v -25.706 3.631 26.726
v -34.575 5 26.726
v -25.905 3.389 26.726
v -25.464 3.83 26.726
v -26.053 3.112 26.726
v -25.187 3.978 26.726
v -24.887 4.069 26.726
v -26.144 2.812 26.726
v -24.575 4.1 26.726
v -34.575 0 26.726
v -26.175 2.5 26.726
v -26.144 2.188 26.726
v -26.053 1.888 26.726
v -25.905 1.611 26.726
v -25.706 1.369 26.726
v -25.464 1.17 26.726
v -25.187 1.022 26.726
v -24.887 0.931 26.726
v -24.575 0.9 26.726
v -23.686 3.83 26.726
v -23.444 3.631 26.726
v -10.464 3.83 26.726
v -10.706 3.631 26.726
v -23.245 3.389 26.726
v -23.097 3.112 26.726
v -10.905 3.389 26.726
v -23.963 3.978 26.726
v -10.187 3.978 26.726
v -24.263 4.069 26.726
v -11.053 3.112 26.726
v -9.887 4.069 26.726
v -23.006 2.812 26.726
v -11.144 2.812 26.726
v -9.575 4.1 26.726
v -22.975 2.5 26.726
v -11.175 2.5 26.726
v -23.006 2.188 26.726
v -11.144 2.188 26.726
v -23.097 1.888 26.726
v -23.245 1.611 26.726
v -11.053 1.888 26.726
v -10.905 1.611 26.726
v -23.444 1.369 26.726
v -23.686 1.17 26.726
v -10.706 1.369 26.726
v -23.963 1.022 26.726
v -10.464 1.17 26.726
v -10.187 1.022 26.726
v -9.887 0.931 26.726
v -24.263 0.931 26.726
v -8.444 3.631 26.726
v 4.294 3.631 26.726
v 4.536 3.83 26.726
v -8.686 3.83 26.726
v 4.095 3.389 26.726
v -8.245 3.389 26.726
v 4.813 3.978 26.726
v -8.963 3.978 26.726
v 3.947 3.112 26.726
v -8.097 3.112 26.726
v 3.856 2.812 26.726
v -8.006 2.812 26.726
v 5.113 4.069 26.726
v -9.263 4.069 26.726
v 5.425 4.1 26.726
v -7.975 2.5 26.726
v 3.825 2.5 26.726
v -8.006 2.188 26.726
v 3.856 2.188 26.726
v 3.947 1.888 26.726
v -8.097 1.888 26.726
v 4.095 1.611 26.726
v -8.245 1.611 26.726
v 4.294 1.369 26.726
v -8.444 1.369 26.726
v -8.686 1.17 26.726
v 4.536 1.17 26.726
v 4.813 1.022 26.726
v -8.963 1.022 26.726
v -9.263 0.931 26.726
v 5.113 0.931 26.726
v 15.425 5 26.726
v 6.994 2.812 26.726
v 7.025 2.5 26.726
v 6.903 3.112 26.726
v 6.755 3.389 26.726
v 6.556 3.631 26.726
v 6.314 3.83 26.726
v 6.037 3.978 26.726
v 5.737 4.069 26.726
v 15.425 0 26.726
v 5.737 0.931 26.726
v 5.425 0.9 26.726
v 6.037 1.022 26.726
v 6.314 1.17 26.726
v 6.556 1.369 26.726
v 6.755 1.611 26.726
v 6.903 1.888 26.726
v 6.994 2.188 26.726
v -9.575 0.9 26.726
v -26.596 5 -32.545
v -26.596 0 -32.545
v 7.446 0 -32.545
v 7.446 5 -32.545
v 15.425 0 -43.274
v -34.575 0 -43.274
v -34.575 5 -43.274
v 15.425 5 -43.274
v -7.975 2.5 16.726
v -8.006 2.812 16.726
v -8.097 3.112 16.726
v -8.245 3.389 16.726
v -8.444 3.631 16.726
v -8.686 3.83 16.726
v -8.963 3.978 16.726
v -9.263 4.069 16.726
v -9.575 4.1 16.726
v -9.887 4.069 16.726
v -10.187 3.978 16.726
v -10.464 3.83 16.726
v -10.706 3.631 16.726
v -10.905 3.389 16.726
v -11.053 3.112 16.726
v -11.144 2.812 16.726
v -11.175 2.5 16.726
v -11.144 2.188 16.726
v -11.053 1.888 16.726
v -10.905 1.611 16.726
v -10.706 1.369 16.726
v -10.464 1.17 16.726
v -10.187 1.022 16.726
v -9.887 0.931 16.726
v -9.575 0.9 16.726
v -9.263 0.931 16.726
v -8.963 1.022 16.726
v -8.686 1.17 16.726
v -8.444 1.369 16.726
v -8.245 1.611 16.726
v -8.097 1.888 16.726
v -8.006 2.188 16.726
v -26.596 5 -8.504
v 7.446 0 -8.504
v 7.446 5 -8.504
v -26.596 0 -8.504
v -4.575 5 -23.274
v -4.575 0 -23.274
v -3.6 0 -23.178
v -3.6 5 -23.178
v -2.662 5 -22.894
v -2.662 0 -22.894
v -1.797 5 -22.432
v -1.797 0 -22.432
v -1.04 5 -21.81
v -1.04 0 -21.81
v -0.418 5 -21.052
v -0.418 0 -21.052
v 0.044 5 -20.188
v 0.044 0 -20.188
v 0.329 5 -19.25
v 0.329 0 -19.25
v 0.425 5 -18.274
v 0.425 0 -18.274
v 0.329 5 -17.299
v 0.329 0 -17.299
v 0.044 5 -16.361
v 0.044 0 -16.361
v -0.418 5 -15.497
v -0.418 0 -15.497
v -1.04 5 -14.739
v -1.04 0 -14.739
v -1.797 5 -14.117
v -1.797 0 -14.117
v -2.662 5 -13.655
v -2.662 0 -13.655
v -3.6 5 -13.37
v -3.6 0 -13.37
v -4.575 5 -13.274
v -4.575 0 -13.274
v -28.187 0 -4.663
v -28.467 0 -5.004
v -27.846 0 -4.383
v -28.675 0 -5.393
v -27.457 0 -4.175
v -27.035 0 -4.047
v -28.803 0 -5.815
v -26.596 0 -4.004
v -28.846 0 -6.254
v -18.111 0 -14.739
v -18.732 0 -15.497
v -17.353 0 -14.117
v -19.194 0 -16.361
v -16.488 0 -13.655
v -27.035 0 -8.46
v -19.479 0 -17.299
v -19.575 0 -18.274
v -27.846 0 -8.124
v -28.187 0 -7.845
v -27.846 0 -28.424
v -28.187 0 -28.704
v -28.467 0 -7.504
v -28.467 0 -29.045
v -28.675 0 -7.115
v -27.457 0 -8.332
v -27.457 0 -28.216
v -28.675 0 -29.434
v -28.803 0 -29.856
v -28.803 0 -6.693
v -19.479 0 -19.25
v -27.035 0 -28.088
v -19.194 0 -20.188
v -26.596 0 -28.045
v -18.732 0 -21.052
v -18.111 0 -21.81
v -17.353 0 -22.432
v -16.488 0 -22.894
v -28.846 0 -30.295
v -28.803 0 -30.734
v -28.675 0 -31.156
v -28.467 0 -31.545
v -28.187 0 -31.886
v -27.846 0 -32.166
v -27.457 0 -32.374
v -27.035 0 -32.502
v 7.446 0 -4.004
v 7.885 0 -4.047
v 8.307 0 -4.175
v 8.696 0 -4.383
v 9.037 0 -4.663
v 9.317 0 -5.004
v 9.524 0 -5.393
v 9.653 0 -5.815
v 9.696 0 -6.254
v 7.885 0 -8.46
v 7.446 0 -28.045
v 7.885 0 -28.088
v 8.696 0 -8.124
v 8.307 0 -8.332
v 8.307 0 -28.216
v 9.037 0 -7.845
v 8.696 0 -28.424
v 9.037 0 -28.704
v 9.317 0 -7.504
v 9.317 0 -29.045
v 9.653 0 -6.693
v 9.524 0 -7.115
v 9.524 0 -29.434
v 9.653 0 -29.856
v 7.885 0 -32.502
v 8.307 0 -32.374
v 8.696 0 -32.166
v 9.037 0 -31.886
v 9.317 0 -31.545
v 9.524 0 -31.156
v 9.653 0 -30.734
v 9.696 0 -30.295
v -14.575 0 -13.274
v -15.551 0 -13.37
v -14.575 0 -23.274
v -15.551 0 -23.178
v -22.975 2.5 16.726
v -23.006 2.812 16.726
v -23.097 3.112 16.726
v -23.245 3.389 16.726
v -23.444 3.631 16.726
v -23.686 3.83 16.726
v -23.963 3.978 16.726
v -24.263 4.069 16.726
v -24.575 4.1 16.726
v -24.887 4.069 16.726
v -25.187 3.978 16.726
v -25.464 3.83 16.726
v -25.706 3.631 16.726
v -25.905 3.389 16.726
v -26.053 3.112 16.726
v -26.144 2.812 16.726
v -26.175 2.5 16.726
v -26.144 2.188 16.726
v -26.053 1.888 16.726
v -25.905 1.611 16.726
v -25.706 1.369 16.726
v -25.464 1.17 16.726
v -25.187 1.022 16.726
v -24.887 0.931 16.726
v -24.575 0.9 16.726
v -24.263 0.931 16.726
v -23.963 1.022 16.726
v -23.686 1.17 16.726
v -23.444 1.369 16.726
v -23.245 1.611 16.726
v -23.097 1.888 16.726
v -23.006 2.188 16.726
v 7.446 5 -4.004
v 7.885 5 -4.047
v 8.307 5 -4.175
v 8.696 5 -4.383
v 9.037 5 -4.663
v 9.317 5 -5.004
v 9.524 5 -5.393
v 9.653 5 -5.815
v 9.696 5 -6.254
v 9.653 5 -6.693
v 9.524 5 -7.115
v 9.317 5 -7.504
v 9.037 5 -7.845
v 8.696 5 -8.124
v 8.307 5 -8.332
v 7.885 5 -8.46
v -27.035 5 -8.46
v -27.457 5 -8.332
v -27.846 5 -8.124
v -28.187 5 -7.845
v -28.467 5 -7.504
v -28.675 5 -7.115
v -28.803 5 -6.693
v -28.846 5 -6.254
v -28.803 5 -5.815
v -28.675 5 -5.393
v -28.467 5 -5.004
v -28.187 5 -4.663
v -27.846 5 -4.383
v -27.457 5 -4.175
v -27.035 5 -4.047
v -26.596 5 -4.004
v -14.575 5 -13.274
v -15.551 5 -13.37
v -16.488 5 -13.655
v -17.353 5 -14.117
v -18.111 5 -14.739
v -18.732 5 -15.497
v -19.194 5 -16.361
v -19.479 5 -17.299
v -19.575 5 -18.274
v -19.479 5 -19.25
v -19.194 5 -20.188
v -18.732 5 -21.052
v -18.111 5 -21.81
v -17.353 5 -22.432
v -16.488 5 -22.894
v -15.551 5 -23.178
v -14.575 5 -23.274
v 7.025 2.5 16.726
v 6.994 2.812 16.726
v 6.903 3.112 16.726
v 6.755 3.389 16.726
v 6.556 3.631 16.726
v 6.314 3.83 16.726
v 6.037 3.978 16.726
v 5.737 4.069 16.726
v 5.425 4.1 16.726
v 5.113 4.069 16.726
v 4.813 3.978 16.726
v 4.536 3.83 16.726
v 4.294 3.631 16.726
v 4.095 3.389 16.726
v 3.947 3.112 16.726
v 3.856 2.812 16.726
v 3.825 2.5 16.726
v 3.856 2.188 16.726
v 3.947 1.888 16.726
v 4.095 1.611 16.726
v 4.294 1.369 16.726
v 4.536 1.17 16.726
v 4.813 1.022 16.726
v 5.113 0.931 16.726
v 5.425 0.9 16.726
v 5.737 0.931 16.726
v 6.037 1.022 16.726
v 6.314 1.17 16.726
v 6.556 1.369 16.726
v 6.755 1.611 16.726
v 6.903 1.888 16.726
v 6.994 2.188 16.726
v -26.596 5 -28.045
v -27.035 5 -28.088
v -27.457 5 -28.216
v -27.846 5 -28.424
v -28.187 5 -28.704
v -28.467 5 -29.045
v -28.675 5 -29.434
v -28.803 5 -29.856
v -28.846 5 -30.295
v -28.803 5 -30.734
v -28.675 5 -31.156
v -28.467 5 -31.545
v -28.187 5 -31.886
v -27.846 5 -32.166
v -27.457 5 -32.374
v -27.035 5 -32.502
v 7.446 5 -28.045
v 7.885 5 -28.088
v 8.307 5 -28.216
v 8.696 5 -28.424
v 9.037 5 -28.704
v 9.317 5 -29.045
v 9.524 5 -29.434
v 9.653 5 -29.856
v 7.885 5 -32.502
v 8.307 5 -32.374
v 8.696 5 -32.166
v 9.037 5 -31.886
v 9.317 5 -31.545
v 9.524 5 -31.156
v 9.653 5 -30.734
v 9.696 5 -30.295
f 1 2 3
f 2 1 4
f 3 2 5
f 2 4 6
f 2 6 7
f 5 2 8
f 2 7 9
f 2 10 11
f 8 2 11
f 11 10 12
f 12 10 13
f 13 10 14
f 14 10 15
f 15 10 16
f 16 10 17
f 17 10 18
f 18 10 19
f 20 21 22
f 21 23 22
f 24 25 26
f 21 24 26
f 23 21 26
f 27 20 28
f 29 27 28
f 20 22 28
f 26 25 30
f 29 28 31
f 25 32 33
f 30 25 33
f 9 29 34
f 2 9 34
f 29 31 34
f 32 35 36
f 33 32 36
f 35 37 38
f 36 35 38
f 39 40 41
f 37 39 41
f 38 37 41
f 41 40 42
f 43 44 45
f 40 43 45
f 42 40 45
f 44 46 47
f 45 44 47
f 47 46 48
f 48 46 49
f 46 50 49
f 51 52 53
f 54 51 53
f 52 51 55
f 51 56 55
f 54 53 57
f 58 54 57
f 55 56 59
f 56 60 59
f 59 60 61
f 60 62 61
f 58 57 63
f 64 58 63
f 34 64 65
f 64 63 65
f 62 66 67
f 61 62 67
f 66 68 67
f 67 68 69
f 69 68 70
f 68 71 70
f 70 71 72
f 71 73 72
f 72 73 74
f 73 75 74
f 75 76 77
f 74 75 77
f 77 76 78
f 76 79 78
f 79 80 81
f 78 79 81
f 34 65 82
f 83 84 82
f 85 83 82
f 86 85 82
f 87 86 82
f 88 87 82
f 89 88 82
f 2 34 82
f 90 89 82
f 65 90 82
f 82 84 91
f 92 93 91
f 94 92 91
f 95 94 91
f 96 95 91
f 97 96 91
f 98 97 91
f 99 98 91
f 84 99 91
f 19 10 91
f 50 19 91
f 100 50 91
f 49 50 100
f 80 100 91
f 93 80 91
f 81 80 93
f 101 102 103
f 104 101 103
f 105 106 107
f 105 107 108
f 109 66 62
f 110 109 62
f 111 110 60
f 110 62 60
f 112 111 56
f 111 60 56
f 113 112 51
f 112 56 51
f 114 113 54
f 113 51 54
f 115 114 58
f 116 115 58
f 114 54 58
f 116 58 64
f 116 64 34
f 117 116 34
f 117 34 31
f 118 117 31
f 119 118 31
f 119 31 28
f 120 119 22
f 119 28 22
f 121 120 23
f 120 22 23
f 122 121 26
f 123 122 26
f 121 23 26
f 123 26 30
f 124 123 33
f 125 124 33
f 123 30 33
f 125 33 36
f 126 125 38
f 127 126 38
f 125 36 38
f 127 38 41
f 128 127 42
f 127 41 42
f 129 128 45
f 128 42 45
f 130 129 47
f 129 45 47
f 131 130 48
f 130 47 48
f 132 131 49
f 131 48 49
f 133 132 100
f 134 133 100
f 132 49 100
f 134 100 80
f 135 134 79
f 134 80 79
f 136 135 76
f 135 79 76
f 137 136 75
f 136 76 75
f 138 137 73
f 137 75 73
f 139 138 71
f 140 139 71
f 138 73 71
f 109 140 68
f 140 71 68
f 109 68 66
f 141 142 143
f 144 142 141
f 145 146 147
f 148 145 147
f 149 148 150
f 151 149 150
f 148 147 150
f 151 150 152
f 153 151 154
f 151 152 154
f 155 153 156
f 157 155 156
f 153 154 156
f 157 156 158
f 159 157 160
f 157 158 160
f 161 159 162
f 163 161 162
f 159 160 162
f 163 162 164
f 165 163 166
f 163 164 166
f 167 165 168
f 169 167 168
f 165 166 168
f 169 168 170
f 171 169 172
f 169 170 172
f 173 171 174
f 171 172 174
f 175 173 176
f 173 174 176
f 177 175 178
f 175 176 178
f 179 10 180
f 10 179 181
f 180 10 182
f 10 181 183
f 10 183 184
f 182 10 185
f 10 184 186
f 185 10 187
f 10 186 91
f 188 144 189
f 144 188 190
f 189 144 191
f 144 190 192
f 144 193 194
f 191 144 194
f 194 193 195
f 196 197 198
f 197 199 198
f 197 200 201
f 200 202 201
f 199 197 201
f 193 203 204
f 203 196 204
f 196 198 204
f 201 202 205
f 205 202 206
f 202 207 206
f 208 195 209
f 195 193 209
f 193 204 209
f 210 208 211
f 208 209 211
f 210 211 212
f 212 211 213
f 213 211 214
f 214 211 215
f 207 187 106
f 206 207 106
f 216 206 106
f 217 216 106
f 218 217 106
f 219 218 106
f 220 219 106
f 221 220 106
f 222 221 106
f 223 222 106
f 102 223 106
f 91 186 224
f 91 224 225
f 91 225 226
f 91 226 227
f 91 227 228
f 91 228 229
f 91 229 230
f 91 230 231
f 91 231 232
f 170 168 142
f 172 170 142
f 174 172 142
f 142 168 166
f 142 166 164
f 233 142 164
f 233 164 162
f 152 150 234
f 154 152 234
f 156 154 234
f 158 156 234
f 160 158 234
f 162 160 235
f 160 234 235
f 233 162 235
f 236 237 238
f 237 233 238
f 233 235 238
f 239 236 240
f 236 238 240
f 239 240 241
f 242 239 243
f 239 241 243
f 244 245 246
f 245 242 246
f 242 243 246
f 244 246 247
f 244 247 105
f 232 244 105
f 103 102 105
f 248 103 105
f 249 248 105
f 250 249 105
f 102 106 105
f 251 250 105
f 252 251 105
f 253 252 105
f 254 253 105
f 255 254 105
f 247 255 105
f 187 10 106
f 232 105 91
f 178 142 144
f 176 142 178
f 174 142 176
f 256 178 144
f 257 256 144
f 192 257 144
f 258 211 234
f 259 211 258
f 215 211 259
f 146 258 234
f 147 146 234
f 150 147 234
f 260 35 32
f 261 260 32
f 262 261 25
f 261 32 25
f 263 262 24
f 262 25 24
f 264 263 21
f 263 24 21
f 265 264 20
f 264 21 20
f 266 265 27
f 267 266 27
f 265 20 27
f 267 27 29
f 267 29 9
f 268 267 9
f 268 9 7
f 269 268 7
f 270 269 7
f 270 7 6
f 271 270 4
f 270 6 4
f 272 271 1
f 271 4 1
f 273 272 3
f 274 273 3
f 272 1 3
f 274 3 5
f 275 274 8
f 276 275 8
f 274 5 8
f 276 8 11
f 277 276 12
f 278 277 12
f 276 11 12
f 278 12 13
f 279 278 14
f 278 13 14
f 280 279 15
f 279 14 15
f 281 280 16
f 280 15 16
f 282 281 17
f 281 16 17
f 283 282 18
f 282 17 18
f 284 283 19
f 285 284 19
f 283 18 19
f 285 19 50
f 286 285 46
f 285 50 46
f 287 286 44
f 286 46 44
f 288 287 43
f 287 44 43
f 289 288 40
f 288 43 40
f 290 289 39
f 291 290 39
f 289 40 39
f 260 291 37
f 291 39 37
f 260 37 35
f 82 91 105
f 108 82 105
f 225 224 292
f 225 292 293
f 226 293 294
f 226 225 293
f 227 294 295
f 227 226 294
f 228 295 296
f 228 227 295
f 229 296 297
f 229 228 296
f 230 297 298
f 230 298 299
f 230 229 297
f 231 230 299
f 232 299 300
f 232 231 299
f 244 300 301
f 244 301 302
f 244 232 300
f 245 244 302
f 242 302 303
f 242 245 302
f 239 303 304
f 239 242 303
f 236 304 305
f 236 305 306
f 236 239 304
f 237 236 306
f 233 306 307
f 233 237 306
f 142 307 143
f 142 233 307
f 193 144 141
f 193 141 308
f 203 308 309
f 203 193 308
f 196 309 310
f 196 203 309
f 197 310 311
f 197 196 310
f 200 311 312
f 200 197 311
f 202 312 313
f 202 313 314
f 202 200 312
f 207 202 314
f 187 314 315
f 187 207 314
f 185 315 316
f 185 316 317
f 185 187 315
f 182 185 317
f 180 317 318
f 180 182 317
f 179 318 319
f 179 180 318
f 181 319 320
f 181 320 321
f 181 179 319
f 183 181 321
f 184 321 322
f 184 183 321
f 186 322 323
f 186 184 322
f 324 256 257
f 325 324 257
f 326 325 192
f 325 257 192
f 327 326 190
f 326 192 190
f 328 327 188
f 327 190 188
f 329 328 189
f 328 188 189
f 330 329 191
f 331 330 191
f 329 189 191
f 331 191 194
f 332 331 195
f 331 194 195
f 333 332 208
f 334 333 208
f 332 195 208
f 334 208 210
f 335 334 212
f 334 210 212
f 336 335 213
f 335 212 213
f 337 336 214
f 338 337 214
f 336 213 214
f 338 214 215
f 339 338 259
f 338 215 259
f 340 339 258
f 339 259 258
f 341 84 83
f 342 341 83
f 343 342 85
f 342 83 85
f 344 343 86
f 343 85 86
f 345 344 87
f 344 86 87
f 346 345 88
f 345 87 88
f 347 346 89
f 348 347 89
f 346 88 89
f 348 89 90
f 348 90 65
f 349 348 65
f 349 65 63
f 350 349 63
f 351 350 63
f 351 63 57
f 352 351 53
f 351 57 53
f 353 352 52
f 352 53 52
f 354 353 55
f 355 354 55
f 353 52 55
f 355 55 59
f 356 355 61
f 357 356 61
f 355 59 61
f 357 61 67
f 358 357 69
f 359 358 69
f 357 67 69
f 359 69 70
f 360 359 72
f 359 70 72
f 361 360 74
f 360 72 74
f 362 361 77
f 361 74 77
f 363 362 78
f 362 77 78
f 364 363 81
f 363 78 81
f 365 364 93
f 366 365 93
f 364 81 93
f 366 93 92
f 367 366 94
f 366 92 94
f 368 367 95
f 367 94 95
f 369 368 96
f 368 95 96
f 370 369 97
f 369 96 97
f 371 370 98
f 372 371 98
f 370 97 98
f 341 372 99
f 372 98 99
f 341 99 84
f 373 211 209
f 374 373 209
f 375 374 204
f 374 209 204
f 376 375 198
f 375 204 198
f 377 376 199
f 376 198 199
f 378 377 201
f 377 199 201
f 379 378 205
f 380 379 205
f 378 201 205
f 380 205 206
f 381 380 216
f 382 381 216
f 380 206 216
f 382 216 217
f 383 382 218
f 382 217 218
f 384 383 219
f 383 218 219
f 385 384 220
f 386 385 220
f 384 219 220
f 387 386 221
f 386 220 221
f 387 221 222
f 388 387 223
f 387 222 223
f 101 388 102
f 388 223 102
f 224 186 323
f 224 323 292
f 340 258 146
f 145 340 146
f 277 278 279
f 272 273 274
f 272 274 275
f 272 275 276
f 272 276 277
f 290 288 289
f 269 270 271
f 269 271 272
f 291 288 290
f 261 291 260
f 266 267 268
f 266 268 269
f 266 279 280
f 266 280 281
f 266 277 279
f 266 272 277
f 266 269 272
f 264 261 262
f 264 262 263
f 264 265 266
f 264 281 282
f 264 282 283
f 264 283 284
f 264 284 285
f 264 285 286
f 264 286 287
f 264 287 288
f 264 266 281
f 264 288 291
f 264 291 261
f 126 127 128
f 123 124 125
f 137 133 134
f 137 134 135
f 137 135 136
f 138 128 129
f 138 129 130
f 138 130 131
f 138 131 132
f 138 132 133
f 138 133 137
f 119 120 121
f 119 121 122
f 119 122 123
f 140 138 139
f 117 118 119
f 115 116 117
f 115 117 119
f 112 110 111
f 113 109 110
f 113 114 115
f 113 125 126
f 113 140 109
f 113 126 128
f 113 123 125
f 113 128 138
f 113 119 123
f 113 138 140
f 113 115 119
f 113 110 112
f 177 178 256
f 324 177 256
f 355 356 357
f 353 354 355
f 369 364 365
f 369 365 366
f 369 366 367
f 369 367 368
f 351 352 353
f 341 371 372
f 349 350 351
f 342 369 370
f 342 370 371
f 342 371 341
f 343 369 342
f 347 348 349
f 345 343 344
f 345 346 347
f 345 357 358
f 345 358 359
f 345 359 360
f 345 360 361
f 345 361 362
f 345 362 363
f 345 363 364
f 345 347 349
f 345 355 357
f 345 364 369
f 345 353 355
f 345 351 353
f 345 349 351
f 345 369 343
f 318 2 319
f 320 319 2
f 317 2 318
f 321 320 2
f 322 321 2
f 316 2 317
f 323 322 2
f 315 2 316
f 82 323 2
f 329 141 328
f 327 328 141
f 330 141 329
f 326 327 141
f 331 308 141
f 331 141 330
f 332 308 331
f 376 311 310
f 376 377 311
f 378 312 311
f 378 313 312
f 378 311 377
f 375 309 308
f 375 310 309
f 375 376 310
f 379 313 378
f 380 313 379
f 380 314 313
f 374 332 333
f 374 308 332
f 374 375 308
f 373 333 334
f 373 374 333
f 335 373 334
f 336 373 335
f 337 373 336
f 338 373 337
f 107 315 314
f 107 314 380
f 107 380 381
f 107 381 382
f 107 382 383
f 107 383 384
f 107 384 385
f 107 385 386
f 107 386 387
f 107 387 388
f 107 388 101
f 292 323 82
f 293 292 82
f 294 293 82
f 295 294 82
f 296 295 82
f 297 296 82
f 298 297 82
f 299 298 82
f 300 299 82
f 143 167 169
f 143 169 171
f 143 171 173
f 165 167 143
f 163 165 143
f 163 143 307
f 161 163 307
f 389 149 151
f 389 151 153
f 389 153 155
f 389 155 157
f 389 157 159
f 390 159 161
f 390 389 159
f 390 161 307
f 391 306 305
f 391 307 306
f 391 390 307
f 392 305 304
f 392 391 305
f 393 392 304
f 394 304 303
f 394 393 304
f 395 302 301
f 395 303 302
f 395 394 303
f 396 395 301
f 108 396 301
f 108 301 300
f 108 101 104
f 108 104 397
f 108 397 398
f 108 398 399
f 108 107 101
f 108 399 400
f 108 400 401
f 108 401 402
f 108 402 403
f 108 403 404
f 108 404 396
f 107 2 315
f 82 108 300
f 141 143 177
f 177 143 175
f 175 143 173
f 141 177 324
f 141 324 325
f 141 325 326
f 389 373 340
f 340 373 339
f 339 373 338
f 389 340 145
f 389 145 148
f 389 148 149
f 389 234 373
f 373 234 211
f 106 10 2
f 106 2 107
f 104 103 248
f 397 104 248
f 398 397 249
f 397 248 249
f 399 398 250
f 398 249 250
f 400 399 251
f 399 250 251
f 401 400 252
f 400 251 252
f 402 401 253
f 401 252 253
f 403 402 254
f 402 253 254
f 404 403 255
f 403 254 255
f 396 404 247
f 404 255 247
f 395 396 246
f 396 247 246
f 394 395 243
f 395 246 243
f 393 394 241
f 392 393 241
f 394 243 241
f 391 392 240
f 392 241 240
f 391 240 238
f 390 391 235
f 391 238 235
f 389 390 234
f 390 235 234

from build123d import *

# Parameters (mm, degrees)
SKETCH1_W           = 50
SKETCH1_H           = 70
BOSS_EXTRUDE1_DEPTH = 5
SKETCH2_R           = 1.6
CUT_EXTRUDE1_DEPTH  = 10


with BuildPart() as part:
    # Sketch1 → Boss-Extrude1 (new body)
    with BuildSketch(Plane(origin=(0, 0, 0), x_dir=(1, 0, 0), z_dir=(0, 1, 0))):
        with Locations((-9.575074469, 8.274395374)):
            Rectangle(SKETCH1_W, SKETCH1_H)
        with BuildLine():
            Line((-26.595889749, 32.545210655), (7.445740812, 32.545210655))
            ThreePointArc((7.445740812, 32.545210655), (9.695740812, 30.295210655), (7.445740812, 28.045210655))
            Line((7.445740812, 28.045210655), (-26.595889749, 28.045210655))
            ThreePointArc((-26.595889749, 28.045210655), (-28.845889749, 30.295210655), (-26.595889749, 32.545210655))
        make_face(mode=Mode.SUBTRACT)
        with BuildLine():
            Line((-14.575074469, 23.274395374), (-4.575074469, 23.274395374))
            ThreePointArc((-4.575074469, 23.274395374), (0.424925531, 18.274395374), (-4.575074469, 13.274395374))
            Line((-4.575074469, 13.274395374), (-14.575074469, 13.274395374))
            ThreePointArc((-14.575074469, 13.274395374), (-19.575074469, 18.274395374), (-14.575074469, 23.274395374))
        make_face(mode=Mode.SUBTRACT)
        with BuildLine():
            Line((-26.595889749, 4.003580094), (7.445740812, 4.003580094))
            ThreePointArc((7.445740812, 4.003580094), (9.695740812, 6.253580094), (7.445740812, 8.503580094))
            Line((7.445740812, 8.503580094), (-26.595889749, 8.503580094))
            ThreePointArc((-26.595889749, 8.503580094), (-28.845889749, 6.253580094), (-26.595889749, 4.003580094))
        make_face(mode=Mode.SUBTRACT)
    extrude(amount=BOSS_EXTRUDE1_DEPTH)

    # Sketch2 → Cut-Extrude1 (cut)
    with BuildSketch(Plane.XY.offset(26.725604626)):
        with Locations((-9.575074469, 2.5)):
            Circle(SKETCH2_R)
        with Locations((-24.575074469, 2.5)):
            Circle(SKETCH2_R)
        with Locations((5.424925531, 2.5)):
            Circle(SKETCH2_R)
    extrude(amount=-CUT_EXTRUDE1_DEPTH, mode=Mode.SUBTRACT)


solid = part.part
